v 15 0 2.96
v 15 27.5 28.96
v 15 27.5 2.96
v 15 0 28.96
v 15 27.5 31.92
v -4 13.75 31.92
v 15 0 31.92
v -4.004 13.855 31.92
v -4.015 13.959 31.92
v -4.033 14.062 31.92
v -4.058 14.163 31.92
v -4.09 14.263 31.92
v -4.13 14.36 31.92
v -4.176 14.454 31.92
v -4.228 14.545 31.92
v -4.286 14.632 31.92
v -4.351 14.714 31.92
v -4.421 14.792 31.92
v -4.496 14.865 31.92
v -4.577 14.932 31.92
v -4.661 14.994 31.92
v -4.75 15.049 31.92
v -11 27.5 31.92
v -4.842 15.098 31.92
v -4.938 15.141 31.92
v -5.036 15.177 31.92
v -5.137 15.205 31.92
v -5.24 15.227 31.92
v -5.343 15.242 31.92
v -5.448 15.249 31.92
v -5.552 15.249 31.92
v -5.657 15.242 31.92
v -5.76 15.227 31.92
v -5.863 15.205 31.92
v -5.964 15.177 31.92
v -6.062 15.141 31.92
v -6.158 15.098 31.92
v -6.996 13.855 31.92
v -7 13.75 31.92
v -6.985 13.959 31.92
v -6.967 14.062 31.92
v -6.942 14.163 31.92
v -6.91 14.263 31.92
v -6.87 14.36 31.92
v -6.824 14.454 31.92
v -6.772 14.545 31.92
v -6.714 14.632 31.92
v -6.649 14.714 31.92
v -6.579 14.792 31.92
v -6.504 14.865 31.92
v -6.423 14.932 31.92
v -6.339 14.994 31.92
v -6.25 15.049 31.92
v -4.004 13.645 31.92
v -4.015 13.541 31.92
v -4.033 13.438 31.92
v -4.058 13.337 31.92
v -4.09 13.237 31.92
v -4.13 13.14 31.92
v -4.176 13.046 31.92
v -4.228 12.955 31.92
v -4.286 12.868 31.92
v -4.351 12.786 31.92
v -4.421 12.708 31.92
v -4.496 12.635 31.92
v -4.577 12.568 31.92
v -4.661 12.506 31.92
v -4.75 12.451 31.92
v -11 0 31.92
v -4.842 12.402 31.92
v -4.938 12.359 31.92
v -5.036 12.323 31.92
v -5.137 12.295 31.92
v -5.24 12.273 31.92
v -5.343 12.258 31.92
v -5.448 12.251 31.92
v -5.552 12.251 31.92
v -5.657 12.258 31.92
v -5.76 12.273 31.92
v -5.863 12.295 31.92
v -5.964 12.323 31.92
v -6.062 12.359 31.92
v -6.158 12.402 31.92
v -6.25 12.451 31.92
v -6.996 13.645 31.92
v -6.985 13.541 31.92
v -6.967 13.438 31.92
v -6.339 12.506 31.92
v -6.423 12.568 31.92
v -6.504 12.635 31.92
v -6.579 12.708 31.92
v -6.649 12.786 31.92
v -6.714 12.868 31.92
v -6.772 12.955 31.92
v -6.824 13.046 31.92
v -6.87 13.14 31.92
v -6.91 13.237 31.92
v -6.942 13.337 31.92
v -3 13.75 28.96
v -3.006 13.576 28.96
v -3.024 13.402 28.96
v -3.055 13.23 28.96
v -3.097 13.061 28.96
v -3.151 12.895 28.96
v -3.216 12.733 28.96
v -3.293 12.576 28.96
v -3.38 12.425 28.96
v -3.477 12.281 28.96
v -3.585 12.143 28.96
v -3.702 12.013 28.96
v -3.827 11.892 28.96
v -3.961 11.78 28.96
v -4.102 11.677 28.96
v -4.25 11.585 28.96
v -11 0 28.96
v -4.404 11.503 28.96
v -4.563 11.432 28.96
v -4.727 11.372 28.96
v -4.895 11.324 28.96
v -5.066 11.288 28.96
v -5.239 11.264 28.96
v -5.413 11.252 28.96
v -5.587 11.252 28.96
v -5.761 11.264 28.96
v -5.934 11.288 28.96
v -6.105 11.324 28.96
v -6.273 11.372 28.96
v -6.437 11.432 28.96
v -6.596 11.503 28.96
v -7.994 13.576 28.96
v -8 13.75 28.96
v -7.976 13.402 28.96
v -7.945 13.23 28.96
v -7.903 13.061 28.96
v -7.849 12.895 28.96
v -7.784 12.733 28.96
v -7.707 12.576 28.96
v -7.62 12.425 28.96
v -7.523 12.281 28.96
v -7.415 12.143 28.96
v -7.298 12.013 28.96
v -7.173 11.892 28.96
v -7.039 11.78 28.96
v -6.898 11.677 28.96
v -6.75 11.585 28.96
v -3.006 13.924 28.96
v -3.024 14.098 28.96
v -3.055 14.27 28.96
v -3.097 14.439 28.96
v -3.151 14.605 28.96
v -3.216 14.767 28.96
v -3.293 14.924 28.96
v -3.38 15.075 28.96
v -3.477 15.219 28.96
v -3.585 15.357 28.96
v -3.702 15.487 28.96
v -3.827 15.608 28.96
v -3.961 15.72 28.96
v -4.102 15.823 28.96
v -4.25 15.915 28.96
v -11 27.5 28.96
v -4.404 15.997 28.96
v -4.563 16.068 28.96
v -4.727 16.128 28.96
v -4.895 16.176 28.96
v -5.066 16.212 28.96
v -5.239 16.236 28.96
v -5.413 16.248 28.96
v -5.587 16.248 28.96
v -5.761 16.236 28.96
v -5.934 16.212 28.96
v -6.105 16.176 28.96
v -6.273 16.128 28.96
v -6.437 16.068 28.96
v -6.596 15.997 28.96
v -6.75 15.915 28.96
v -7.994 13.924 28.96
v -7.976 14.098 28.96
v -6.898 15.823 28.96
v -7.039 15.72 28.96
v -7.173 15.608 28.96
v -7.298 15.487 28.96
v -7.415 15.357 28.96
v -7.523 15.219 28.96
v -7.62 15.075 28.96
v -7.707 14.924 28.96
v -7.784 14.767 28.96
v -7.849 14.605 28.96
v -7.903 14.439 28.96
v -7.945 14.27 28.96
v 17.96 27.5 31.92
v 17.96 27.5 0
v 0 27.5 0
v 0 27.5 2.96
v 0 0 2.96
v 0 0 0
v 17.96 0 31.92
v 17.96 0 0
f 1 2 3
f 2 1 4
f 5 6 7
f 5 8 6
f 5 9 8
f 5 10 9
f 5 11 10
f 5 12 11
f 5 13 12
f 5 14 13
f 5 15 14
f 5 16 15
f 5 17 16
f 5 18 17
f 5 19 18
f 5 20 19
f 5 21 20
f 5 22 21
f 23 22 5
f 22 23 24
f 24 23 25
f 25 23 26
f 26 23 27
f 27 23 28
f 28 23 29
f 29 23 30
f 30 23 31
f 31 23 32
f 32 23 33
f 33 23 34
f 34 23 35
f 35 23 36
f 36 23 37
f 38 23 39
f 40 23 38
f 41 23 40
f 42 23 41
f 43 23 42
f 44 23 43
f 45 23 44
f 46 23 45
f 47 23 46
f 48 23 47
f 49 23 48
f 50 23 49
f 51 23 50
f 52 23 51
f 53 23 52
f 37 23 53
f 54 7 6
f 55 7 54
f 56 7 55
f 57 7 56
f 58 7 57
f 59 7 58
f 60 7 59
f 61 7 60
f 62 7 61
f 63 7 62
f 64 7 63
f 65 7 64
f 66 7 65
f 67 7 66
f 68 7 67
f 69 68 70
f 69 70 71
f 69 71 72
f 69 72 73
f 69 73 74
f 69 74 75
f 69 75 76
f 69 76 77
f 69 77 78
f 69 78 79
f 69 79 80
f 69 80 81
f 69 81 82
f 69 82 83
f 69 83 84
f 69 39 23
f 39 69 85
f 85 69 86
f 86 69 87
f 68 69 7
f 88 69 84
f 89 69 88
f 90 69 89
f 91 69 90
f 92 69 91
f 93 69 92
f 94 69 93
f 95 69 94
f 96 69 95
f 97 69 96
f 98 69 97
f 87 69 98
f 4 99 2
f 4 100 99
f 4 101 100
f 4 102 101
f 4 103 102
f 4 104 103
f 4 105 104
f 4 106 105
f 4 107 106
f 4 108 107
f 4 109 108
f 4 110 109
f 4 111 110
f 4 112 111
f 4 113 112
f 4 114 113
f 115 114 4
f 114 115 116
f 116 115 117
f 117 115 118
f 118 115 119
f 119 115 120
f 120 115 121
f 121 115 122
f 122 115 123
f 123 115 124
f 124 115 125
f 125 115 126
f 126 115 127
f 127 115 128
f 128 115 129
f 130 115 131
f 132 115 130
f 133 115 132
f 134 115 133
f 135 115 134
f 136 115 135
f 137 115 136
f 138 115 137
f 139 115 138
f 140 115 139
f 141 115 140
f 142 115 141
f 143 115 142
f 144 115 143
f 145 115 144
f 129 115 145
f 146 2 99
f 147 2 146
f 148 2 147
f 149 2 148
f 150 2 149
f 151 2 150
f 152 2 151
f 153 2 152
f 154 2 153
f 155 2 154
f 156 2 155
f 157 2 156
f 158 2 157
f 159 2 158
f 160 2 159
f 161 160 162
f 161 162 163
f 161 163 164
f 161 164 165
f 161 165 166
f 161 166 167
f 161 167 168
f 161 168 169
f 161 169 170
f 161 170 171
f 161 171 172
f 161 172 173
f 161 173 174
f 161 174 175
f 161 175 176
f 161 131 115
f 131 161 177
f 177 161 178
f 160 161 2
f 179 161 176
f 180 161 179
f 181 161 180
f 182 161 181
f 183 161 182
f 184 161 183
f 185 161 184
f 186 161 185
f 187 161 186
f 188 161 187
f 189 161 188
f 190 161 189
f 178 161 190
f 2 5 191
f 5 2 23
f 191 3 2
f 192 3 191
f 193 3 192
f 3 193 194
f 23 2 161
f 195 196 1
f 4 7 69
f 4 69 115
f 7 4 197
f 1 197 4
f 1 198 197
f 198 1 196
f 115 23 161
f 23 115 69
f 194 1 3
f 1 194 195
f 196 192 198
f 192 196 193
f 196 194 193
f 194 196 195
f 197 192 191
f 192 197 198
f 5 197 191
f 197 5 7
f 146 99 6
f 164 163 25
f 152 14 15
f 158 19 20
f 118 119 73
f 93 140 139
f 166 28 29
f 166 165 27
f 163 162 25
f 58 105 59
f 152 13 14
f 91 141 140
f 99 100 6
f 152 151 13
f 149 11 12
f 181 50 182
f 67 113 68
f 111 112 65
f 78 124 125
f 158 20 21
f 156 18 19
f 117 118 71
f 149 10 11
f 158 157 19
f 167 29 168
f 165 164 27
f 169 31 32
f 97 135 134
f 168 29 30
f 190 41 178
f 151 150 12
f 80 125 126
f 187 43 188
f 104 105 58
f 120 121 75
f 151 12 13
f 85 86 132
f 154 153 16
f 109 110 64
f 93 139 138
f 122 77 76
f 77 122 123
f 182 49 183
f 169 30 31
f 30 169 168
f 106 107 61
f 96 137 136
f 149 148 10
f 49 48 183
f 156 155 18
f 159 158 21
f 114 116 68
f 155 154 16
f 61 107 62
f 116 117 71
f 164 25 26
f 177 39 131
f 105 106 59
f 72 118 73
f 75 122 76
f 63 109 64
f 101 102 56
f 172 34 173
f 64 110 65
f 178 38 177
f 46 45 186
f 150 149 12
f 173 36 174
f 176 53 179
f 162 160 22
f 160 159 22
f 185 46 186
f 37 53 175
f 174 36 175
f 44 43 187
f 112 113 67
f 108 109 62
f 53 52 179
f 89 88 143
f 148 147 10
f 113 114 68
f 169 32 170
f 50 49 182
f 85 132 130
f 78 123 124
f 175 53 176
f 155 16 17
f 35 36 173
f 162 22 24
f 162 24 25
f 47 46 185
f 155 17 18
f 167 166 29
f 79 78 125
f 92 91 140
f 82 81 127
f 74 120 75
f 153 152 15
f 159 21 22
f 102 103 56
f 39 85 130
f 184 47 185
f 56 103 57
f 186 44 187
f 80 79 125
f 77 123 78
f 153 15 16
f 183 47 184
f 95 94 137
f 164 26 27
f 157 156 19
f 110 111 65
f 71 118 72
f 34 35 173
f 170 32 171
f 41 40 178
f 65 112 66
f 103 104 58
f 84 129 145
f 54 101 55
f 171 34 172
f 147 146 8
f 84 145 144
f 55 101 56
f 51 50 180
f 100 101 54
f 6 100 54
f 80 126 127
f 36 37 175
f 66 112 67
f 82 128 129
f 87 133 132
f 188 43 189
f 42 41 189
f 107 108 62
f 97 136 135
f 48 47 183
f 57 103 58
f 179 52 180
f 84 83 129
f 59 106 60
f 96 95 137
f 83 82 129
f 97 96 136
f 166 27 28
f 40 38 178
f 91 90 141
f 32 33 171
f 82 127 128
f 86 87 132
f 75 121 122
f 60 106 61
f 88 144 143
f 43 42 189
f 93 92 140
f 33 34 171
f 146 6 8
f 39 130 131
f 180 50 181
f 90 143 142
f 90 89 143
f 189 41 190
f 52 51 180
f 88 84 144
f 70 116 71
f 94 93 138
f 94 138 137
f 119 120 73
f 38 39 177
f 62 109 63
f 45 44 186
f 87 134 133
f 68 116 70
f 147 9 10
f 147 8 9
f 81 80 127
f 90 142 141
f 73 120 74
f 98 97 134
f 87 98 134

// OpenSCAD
$fn=90;
//Höhe Spax-Schraubenkopf
sk=1.7;
//Spax oben
so=5.0;
//Spax Durchmesser Gewinde
sd=3.0;
//Spax Höhe Gewinde
shg=10;
//Schraubenzieher-Zusatz, damit man oben bequem hinkommt, In der Mitte Loch und links rechts nochmal so viel Platz wie das Gewinde
sz=so+sd*2;

//Thickness
t=2.96;//1.7+1.1;//=2.8 ==> recommended from slicer 2.96

//################

//Höhe Bauelement
//h=27; //Switch
//h=20; //Server
h=26; //USB-Hub

//Breite L/R unten
//lr=4; //Switch
//lr=15; //Server
lr=15; //USB-Hub

//################

//Tiefe
d=sz*2.5; //Muss mindestens sz*1 sein, damit vorne hinten genauso viel Abstand zu Schraube ist, wie links rechts

module spax()
{
    translate([-sz/2,d/2,h+t])    
    color("silver")
        {        
        cylinder(h=t,d1=so,d2=sd);
        
        translate([0,0,0])
        cylinder(h=shg,d1=sd,d2=sd);
        }
}

module halter_bauteil()
{
    cube([lr,d,t]);
}

module abstand_halter()
{
    color("red")
    translate([lr,0,0])
    cube([t,d,h+t*2]); //z = Höhe des Bauteils + Thickness*2 von den anderen zwei Haltern
}

module zusatz_tischplatte()
{
    color("green")
    translate([-sz,0,0])
    cube([sz,d,t]);
}

module halter_tischplatte()
{
    translate([0,0,h+t])
    {    
        halter_bauteil();
        zusatz_tischplatte();
    }
}

module bauteil_komplett()
{
    halter_bauteil();
    abstand_halter();
    halter_tischplatte();
}

difference()
{
    bauteil_komplett();
    spax();
}
